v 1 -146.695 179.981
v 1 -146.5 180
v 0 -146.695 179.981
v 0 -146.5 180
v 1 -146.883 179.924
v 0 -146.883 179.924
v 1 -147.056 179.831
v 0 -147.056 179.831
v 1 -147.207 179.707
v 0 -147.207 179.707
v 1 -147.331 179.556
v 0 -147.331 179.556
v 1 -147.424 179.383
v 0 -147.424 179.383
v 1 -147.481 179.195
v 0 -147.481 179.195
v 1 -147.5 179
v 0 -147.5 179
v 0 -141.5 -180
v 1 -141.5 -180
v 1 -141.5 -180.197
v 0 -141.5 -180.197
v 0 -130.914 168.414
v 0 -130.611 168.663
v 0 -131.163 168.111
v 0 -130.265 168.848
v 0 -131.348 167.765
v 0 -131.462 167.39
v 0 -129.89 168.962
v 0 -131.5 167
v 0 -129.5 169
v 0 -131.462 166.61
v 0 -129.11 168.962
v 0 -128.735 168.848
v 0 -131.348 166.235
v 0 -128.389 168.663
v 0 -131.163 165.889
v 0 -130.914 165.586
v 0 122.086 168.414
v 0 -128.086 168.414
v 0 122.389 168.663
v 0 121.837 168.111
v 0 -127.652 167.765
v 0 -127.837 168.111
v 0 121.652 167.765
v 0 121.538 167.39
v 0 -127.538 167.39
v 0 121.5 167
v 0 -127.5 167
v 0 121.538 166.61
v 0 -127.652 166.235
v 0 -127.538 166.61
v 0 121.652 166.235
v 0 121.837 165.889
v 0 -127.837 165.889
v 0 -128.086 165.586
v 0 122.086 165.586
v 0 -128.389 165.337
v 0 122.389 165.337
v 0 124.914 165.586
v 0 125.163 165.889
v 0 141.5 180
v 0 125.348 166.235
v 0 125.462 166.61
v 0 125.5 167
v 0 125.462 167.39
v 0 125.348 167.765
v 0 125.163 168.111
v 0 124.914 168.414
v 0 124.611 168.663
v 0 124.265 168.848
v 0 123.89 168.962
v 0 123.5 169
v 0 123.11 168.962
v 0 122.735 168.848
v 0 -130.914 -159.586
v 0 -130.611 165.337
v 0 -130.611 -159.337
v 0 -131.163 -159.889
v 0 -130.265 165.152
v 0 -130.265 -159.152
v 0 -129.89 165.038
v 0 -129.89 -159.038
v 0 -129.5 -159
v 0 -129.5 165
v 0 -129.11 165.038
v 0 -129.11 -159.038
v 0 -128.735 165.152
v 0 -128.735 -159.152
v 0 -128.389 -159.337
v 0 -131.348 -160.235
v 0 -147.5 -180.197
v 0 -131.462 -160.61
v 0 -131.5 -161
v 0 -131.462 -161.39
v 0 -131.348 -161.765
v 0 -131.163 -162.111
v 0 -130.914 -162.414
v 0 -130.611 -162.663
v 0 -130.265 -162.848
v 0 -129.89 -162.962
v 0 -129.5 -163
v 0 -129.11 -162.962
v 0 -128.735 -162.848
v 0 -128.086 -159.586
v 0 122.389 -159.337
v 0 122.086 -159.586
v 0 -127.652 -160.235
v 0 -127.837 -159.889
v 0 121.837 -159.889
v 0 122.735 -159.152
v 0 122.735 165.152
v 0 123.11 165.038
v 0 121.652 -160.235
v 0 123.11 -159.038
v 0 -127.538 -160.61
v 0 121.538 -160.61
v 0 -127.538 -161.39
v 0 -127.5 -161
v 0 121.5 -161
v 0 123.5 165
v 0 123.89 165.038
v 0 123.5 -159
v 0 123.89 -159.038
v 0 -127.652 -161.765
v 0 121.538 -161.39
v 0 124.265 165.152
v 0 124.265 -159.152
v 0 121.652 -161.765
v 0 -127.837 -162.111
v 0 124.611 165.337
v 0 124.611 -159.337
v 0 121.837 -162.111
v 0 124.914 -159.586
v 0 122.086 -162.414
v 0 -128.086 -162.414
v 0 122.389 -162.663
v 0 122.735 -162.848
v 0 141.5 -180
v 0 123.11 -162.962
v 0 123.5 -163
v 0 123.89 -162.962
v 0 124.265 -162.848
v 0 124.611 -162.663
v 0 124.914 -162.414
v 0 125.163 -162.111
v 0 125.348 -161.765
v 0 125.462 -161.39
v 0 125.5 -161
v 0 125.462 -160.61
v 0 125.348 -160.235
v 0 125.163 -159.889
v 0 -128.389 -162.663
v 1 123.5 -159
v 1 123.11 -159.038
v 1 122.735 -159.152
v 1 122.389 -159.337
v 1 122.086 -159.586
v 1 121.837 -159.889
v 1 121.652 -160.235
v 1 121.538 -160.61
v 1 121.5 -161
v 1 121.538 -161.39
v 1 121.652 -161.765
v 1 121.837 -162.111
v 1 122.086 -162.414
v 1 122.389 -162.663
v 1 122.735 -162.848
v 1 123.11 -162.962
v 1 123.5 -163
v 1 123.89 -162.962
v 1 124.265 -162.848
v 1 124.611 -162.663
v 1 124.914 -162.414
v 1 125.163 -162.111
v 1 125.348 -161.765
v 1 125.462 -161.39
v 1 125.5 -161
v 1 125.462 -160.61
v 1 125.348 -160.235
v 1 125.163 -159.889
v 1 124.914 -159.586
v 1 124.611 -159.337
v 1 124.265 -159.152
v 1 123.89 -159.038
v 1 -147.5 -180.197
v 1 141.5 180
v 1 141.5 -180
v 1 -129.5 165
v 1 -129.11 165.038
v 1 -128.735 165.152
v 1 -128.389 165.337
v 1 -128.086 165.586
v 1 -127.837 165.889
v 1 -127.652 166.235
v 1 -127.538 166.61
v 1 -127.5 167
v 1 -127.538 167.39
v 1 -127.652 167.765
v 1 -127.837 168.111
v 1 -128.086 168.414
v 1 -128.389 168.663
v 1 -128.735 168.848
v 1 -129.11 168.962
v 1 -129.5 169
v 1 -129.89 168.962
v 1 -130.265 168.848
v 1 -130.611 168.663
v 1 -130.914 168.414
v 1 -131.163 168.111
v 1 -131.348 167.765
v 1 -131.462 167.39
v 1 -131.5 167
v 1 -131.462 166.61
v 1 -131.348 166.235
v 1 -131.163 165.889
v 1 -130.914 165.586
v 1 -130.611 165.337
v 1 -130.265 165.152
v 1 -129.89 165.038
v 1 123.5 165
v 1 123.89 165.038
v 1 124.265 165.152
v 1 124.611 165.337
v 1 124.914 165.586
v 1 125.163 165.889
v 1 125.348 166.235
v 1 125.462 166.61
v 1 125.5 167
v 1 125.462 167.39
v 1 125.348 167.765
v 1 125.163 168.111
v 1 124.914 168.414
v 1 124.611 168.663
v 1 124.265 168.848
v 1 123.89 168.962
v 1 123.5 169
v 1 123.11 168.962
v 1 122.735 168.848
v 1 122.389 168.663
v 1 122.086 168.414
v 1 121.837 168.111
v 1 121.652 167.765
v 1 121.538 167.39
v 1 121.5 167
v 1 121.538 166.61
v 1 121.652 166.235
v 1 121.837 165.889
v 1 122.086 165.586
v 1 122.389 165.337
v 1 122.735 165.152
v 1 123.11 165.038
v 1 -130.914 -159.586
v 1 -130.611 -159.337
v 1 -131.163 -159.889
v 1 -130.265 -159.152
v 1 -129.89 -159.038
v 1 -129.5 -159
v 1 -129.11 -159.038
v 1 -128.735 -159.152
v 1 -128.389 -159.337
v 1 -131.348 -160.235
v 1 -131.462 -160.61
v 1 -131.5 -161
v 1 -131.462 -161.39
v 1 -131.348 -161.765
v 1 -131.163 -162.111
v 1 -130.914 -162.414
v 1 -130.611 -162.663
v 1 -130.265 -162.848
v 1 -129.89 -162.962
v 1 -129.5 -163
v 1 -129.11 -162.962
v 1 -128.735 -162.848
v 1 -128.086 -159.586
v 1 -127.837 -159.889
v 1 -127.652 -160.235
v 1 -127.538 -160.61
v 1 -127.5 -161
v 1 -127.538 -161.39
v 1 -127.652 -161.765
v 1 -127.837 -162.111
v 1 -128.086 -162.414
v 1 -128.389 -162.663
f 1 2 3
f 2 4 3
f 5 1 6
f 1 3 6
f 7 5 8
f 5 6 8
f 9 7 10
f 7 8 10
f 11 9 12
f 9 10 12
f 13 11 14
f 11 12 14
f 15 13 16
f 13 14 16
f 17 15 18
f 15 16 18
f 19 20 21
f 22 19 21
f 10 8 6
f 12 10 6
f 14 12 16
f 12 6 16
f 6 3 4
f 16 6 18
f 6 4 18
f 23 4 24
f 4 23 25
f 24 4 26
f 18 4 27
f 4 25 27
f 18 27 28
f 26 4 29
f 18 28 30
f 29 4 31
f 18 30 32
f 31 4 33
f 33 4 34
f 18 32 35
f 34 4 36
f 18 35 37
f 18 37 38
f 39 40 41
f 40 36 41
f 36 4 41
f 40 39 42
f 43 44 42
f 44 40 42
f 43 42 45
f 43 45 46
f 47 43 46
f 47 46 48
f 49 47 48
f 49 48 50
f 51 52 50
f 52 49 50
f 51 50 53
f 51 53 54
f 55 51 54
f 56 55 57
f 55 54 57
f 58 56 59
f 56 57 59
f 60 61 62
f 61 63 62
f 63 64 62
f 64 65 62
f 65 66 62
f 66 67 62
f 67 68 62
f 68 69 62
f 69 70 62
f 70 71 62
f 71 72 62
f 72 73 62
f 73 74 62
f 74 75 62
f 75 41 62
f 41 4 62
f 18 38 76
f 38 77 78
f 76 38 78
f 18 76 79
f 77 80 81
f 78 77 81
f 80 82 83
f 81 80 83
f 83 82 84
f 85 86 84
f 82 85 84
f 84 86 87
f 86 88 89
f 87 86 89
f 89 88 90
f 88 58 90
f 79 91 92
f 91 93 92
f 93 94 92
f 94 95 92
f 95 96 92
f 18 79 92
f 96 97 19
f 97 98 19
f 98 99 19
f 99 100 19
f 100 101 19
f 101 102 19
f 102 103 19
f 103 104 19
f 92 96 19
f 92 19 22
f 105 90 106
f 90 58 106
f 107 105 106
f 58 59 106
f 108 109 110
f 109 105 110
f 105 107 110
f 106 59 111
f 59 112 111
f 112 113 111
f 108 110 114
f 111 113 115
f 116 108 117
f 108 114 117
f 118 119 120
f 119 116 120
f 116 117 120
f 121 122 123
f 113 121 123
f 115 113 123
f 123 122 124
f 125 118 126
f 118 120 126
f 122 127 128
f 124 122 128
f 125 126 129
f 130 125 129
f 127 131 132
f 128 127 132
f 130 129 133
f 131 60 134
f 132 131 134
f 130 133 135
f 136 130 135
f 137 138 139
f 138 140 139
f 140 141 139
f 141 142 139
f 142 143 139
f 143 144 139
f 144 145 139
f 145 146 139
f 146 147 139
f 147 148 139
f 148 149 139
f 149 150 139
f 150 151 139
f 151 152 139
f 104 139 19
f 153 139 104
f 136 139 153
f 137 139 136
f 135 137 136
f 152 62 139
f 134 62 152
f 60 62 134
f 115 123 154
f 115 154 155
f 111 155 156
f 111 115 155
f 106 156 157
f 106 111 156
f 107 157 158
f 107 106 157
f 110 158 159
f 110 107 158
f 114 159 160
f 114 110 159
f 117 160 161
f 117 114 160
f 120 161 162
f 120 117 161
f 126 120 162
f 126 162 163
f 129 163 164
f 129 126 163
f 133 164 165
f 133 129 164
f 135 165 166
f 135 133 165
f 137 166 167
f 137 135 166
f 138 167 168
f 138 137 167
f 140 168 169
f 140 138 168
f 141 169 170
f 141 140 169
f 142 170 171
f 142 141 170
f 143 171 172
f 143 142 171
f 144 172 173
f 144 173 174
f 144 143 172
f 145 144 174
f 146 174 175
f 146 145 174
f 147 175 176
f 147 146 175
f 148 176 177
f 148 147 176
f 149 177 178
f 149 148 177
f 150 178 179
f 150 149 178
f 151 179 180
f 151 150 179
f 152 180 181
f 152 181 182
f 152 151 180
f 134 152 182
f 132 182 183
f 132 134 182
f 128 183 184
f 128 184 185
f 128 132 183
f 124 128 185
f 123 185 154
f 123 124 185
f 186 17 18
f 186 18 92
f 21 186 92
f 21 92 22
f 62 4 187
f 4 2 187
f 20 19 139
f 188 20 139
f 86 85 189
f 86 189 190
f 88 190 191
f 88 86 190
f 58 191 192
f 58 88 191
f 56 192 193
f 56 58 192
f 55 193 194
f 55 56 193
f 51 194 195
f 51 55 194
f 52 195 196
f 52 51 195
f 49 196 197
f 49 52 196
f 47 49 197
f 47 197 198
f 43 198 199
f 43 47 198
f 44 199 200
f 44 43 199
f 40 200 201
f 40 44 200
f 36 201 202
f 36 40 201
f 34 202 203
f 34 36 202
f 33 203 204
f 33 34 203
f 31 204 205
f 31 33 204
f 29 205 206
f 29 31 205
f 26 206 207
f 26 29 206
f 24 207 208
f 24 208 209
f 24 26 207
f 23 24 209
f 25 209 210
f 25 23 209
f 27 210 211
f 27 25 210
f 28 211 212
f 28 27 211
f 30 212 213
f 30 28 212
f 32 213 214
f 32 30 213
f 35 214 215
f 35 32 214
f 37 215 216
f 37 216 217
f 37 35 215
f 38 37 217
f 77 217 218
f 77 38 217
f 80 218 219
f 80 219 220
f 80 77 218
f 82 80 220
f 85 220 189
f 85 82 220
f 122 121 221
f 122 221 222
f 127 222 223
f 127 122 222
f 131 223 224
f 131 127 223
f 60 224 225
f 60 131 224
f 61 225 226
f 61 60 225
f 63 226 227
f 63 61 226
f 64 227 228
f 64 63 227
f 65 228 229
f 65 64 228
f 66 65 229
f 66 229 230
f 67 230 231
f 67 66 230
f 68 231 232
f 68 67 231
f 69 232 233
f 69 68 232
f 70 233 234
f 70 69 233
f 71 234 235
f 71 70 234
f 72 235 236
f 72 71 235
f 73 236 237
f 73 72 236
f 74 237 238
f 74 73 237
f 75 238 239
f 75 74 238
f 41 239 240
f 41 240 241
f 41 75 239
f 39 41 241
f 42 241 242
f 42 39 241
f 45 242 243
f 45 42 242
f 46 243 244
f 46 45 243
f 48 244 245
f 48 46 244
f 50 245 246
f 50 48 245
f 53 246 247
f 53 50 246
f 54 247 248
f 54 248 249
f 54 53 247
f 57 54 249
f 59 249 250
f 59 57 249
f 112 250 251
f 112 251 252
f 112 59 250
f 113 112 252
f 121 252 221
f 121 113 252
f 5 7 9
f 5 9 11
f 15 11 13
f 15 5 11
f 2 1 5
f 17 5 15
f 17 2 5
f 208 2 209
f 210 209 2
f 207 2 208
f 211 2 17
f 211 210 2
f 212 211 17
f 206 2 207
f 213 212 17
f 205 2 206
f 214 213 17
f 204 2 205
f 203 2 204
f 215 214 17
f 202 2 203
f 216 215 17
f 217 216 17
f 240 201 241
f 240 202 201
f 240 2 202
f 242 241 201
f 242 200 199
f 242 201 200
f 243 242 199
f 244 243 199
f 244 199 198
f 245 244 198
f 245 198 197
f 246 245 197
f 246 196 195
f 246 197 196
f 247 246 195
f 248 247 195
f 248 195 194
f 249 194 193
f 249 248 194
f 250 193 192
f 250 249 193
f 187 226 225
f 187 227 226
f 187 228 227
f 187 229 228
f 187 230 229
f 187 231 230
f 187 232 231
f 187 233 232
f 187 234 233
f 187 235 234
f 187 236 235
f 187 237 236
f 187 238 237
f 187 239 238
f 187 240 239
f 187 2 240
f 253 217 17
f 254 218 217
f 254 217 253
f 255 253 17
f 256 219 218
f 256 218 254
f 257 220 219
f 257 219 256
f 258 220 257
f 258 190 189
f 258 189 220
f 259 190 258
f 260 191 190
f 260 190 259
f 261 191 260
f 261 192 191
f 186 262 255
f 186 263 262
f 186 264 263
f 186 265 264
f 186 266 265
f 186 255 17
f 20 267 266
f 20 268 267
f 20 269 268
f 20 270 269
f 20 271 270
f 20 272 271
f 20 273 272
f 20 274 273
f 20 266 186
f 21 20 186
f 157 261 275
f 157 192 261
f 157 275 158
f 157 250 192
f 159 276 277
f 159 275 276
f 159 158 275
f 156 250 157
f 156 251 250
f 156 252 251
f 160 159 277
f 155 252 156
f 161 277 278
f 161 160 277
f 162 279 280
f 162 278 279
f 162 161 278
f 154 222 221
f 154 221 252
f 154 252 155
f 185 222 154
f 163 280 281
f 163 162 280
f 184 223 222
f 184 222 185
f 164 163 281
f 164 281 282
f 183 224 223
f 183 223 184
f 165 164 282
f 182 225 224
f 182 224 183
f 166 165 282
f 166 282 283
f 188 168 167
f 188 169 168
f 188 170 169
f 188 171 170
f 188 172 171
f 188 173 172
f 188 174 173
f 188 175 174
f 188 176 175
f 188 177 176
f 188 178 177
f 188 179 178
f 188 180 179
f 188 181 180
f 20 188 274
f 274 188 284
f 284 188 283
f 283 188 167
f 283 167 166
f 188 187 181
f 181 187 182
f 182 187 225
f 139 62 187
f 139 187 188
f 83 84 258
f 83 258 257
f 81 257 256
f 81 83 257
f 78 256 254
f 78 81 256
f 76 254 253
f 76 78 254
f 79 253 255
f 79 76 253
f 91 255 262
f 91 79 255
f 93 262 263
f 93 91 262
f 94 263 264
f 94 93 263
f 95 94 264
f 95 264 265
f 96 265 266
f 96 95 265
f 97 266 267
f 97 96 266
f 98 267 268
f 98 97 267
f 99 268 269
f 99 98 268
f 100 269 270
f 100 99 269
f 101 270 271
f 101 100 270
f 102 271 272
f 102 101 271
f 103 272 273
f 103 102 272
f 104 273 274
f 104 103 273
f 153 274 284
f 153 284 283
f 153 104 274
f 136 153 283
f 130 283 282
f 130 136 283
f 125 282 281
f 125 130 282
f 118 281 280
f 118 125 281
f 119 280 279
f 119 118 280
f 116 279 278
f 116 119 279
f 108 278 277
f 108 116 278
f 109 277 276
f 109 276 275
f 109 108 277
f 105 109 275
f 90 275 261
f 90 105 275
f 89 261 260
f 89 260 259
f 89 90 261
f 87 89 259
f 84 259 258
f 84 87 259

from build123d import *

# Parameters (mm, degrees)
SKETCH1_W           = 360
SKETCH1_H           = 283
SKETCH1_R           = 2
BOSS_EXTRUDE1_DEPTH = 1
SKETCH3_W           = 360.196832798
SKETCH3_H           = 6
BOSS_EXTRUDE2_DEPTH = 1
FILLET1_R           = 1


with BuildPart() as part:
    # Sketch1 → Boss-Extrude1 (new body)
    with BuildSketch(Plane(origin=(0, 0, 0), x_dir=(0, 0, -1), z_dir=(1, 0, 0))):
        Rectangle(SKETCH1_W, SKETCH1_H)
        with Locations((-167, 123.5)):
            Circle(SKETCH1_R, mode=Mode.SUBTRACT)
        with Locations((-167, -129.5)):
            Circle(SKETCH1_R, mode=Mode.SUBTRACT)
        with Locations(Location((161, 123.5, 0), (0, 0, 180))):
            Circle(SKETCH1_R, mode=Mode.SUBTRACT)
        with Locations(Location((161, -129.5, 0), (0, 0, 180))):
            Circle(SKETCH1_R, mode=Mode.SUBTRACT)
    extrude(amount=BOSS_EXTRUDE1_DEPTH)

    # Sketch3 → Boss-Extrude2 (add)
    with BuildSketch(Plane(origin=(1, 0, 0), x_dir=(0, 0, -1), z_dir=(1, 0, 0))):
        with Locations((0.098416399, -144.5)):
            Rectangle(SKETCH3_W, SKETCH3_H)
    extrude(amount=-BOSS_EXTRUDE2_DEPTH)

    # Fillet1
    fillet1_edges = [part.edges().sort_by_distance(p)[0] for p in [
        (0.5, -147.5, 180),
    ]]
    fillet(fillet1_edges, radius=FILLET1_R)


solid = part.part
